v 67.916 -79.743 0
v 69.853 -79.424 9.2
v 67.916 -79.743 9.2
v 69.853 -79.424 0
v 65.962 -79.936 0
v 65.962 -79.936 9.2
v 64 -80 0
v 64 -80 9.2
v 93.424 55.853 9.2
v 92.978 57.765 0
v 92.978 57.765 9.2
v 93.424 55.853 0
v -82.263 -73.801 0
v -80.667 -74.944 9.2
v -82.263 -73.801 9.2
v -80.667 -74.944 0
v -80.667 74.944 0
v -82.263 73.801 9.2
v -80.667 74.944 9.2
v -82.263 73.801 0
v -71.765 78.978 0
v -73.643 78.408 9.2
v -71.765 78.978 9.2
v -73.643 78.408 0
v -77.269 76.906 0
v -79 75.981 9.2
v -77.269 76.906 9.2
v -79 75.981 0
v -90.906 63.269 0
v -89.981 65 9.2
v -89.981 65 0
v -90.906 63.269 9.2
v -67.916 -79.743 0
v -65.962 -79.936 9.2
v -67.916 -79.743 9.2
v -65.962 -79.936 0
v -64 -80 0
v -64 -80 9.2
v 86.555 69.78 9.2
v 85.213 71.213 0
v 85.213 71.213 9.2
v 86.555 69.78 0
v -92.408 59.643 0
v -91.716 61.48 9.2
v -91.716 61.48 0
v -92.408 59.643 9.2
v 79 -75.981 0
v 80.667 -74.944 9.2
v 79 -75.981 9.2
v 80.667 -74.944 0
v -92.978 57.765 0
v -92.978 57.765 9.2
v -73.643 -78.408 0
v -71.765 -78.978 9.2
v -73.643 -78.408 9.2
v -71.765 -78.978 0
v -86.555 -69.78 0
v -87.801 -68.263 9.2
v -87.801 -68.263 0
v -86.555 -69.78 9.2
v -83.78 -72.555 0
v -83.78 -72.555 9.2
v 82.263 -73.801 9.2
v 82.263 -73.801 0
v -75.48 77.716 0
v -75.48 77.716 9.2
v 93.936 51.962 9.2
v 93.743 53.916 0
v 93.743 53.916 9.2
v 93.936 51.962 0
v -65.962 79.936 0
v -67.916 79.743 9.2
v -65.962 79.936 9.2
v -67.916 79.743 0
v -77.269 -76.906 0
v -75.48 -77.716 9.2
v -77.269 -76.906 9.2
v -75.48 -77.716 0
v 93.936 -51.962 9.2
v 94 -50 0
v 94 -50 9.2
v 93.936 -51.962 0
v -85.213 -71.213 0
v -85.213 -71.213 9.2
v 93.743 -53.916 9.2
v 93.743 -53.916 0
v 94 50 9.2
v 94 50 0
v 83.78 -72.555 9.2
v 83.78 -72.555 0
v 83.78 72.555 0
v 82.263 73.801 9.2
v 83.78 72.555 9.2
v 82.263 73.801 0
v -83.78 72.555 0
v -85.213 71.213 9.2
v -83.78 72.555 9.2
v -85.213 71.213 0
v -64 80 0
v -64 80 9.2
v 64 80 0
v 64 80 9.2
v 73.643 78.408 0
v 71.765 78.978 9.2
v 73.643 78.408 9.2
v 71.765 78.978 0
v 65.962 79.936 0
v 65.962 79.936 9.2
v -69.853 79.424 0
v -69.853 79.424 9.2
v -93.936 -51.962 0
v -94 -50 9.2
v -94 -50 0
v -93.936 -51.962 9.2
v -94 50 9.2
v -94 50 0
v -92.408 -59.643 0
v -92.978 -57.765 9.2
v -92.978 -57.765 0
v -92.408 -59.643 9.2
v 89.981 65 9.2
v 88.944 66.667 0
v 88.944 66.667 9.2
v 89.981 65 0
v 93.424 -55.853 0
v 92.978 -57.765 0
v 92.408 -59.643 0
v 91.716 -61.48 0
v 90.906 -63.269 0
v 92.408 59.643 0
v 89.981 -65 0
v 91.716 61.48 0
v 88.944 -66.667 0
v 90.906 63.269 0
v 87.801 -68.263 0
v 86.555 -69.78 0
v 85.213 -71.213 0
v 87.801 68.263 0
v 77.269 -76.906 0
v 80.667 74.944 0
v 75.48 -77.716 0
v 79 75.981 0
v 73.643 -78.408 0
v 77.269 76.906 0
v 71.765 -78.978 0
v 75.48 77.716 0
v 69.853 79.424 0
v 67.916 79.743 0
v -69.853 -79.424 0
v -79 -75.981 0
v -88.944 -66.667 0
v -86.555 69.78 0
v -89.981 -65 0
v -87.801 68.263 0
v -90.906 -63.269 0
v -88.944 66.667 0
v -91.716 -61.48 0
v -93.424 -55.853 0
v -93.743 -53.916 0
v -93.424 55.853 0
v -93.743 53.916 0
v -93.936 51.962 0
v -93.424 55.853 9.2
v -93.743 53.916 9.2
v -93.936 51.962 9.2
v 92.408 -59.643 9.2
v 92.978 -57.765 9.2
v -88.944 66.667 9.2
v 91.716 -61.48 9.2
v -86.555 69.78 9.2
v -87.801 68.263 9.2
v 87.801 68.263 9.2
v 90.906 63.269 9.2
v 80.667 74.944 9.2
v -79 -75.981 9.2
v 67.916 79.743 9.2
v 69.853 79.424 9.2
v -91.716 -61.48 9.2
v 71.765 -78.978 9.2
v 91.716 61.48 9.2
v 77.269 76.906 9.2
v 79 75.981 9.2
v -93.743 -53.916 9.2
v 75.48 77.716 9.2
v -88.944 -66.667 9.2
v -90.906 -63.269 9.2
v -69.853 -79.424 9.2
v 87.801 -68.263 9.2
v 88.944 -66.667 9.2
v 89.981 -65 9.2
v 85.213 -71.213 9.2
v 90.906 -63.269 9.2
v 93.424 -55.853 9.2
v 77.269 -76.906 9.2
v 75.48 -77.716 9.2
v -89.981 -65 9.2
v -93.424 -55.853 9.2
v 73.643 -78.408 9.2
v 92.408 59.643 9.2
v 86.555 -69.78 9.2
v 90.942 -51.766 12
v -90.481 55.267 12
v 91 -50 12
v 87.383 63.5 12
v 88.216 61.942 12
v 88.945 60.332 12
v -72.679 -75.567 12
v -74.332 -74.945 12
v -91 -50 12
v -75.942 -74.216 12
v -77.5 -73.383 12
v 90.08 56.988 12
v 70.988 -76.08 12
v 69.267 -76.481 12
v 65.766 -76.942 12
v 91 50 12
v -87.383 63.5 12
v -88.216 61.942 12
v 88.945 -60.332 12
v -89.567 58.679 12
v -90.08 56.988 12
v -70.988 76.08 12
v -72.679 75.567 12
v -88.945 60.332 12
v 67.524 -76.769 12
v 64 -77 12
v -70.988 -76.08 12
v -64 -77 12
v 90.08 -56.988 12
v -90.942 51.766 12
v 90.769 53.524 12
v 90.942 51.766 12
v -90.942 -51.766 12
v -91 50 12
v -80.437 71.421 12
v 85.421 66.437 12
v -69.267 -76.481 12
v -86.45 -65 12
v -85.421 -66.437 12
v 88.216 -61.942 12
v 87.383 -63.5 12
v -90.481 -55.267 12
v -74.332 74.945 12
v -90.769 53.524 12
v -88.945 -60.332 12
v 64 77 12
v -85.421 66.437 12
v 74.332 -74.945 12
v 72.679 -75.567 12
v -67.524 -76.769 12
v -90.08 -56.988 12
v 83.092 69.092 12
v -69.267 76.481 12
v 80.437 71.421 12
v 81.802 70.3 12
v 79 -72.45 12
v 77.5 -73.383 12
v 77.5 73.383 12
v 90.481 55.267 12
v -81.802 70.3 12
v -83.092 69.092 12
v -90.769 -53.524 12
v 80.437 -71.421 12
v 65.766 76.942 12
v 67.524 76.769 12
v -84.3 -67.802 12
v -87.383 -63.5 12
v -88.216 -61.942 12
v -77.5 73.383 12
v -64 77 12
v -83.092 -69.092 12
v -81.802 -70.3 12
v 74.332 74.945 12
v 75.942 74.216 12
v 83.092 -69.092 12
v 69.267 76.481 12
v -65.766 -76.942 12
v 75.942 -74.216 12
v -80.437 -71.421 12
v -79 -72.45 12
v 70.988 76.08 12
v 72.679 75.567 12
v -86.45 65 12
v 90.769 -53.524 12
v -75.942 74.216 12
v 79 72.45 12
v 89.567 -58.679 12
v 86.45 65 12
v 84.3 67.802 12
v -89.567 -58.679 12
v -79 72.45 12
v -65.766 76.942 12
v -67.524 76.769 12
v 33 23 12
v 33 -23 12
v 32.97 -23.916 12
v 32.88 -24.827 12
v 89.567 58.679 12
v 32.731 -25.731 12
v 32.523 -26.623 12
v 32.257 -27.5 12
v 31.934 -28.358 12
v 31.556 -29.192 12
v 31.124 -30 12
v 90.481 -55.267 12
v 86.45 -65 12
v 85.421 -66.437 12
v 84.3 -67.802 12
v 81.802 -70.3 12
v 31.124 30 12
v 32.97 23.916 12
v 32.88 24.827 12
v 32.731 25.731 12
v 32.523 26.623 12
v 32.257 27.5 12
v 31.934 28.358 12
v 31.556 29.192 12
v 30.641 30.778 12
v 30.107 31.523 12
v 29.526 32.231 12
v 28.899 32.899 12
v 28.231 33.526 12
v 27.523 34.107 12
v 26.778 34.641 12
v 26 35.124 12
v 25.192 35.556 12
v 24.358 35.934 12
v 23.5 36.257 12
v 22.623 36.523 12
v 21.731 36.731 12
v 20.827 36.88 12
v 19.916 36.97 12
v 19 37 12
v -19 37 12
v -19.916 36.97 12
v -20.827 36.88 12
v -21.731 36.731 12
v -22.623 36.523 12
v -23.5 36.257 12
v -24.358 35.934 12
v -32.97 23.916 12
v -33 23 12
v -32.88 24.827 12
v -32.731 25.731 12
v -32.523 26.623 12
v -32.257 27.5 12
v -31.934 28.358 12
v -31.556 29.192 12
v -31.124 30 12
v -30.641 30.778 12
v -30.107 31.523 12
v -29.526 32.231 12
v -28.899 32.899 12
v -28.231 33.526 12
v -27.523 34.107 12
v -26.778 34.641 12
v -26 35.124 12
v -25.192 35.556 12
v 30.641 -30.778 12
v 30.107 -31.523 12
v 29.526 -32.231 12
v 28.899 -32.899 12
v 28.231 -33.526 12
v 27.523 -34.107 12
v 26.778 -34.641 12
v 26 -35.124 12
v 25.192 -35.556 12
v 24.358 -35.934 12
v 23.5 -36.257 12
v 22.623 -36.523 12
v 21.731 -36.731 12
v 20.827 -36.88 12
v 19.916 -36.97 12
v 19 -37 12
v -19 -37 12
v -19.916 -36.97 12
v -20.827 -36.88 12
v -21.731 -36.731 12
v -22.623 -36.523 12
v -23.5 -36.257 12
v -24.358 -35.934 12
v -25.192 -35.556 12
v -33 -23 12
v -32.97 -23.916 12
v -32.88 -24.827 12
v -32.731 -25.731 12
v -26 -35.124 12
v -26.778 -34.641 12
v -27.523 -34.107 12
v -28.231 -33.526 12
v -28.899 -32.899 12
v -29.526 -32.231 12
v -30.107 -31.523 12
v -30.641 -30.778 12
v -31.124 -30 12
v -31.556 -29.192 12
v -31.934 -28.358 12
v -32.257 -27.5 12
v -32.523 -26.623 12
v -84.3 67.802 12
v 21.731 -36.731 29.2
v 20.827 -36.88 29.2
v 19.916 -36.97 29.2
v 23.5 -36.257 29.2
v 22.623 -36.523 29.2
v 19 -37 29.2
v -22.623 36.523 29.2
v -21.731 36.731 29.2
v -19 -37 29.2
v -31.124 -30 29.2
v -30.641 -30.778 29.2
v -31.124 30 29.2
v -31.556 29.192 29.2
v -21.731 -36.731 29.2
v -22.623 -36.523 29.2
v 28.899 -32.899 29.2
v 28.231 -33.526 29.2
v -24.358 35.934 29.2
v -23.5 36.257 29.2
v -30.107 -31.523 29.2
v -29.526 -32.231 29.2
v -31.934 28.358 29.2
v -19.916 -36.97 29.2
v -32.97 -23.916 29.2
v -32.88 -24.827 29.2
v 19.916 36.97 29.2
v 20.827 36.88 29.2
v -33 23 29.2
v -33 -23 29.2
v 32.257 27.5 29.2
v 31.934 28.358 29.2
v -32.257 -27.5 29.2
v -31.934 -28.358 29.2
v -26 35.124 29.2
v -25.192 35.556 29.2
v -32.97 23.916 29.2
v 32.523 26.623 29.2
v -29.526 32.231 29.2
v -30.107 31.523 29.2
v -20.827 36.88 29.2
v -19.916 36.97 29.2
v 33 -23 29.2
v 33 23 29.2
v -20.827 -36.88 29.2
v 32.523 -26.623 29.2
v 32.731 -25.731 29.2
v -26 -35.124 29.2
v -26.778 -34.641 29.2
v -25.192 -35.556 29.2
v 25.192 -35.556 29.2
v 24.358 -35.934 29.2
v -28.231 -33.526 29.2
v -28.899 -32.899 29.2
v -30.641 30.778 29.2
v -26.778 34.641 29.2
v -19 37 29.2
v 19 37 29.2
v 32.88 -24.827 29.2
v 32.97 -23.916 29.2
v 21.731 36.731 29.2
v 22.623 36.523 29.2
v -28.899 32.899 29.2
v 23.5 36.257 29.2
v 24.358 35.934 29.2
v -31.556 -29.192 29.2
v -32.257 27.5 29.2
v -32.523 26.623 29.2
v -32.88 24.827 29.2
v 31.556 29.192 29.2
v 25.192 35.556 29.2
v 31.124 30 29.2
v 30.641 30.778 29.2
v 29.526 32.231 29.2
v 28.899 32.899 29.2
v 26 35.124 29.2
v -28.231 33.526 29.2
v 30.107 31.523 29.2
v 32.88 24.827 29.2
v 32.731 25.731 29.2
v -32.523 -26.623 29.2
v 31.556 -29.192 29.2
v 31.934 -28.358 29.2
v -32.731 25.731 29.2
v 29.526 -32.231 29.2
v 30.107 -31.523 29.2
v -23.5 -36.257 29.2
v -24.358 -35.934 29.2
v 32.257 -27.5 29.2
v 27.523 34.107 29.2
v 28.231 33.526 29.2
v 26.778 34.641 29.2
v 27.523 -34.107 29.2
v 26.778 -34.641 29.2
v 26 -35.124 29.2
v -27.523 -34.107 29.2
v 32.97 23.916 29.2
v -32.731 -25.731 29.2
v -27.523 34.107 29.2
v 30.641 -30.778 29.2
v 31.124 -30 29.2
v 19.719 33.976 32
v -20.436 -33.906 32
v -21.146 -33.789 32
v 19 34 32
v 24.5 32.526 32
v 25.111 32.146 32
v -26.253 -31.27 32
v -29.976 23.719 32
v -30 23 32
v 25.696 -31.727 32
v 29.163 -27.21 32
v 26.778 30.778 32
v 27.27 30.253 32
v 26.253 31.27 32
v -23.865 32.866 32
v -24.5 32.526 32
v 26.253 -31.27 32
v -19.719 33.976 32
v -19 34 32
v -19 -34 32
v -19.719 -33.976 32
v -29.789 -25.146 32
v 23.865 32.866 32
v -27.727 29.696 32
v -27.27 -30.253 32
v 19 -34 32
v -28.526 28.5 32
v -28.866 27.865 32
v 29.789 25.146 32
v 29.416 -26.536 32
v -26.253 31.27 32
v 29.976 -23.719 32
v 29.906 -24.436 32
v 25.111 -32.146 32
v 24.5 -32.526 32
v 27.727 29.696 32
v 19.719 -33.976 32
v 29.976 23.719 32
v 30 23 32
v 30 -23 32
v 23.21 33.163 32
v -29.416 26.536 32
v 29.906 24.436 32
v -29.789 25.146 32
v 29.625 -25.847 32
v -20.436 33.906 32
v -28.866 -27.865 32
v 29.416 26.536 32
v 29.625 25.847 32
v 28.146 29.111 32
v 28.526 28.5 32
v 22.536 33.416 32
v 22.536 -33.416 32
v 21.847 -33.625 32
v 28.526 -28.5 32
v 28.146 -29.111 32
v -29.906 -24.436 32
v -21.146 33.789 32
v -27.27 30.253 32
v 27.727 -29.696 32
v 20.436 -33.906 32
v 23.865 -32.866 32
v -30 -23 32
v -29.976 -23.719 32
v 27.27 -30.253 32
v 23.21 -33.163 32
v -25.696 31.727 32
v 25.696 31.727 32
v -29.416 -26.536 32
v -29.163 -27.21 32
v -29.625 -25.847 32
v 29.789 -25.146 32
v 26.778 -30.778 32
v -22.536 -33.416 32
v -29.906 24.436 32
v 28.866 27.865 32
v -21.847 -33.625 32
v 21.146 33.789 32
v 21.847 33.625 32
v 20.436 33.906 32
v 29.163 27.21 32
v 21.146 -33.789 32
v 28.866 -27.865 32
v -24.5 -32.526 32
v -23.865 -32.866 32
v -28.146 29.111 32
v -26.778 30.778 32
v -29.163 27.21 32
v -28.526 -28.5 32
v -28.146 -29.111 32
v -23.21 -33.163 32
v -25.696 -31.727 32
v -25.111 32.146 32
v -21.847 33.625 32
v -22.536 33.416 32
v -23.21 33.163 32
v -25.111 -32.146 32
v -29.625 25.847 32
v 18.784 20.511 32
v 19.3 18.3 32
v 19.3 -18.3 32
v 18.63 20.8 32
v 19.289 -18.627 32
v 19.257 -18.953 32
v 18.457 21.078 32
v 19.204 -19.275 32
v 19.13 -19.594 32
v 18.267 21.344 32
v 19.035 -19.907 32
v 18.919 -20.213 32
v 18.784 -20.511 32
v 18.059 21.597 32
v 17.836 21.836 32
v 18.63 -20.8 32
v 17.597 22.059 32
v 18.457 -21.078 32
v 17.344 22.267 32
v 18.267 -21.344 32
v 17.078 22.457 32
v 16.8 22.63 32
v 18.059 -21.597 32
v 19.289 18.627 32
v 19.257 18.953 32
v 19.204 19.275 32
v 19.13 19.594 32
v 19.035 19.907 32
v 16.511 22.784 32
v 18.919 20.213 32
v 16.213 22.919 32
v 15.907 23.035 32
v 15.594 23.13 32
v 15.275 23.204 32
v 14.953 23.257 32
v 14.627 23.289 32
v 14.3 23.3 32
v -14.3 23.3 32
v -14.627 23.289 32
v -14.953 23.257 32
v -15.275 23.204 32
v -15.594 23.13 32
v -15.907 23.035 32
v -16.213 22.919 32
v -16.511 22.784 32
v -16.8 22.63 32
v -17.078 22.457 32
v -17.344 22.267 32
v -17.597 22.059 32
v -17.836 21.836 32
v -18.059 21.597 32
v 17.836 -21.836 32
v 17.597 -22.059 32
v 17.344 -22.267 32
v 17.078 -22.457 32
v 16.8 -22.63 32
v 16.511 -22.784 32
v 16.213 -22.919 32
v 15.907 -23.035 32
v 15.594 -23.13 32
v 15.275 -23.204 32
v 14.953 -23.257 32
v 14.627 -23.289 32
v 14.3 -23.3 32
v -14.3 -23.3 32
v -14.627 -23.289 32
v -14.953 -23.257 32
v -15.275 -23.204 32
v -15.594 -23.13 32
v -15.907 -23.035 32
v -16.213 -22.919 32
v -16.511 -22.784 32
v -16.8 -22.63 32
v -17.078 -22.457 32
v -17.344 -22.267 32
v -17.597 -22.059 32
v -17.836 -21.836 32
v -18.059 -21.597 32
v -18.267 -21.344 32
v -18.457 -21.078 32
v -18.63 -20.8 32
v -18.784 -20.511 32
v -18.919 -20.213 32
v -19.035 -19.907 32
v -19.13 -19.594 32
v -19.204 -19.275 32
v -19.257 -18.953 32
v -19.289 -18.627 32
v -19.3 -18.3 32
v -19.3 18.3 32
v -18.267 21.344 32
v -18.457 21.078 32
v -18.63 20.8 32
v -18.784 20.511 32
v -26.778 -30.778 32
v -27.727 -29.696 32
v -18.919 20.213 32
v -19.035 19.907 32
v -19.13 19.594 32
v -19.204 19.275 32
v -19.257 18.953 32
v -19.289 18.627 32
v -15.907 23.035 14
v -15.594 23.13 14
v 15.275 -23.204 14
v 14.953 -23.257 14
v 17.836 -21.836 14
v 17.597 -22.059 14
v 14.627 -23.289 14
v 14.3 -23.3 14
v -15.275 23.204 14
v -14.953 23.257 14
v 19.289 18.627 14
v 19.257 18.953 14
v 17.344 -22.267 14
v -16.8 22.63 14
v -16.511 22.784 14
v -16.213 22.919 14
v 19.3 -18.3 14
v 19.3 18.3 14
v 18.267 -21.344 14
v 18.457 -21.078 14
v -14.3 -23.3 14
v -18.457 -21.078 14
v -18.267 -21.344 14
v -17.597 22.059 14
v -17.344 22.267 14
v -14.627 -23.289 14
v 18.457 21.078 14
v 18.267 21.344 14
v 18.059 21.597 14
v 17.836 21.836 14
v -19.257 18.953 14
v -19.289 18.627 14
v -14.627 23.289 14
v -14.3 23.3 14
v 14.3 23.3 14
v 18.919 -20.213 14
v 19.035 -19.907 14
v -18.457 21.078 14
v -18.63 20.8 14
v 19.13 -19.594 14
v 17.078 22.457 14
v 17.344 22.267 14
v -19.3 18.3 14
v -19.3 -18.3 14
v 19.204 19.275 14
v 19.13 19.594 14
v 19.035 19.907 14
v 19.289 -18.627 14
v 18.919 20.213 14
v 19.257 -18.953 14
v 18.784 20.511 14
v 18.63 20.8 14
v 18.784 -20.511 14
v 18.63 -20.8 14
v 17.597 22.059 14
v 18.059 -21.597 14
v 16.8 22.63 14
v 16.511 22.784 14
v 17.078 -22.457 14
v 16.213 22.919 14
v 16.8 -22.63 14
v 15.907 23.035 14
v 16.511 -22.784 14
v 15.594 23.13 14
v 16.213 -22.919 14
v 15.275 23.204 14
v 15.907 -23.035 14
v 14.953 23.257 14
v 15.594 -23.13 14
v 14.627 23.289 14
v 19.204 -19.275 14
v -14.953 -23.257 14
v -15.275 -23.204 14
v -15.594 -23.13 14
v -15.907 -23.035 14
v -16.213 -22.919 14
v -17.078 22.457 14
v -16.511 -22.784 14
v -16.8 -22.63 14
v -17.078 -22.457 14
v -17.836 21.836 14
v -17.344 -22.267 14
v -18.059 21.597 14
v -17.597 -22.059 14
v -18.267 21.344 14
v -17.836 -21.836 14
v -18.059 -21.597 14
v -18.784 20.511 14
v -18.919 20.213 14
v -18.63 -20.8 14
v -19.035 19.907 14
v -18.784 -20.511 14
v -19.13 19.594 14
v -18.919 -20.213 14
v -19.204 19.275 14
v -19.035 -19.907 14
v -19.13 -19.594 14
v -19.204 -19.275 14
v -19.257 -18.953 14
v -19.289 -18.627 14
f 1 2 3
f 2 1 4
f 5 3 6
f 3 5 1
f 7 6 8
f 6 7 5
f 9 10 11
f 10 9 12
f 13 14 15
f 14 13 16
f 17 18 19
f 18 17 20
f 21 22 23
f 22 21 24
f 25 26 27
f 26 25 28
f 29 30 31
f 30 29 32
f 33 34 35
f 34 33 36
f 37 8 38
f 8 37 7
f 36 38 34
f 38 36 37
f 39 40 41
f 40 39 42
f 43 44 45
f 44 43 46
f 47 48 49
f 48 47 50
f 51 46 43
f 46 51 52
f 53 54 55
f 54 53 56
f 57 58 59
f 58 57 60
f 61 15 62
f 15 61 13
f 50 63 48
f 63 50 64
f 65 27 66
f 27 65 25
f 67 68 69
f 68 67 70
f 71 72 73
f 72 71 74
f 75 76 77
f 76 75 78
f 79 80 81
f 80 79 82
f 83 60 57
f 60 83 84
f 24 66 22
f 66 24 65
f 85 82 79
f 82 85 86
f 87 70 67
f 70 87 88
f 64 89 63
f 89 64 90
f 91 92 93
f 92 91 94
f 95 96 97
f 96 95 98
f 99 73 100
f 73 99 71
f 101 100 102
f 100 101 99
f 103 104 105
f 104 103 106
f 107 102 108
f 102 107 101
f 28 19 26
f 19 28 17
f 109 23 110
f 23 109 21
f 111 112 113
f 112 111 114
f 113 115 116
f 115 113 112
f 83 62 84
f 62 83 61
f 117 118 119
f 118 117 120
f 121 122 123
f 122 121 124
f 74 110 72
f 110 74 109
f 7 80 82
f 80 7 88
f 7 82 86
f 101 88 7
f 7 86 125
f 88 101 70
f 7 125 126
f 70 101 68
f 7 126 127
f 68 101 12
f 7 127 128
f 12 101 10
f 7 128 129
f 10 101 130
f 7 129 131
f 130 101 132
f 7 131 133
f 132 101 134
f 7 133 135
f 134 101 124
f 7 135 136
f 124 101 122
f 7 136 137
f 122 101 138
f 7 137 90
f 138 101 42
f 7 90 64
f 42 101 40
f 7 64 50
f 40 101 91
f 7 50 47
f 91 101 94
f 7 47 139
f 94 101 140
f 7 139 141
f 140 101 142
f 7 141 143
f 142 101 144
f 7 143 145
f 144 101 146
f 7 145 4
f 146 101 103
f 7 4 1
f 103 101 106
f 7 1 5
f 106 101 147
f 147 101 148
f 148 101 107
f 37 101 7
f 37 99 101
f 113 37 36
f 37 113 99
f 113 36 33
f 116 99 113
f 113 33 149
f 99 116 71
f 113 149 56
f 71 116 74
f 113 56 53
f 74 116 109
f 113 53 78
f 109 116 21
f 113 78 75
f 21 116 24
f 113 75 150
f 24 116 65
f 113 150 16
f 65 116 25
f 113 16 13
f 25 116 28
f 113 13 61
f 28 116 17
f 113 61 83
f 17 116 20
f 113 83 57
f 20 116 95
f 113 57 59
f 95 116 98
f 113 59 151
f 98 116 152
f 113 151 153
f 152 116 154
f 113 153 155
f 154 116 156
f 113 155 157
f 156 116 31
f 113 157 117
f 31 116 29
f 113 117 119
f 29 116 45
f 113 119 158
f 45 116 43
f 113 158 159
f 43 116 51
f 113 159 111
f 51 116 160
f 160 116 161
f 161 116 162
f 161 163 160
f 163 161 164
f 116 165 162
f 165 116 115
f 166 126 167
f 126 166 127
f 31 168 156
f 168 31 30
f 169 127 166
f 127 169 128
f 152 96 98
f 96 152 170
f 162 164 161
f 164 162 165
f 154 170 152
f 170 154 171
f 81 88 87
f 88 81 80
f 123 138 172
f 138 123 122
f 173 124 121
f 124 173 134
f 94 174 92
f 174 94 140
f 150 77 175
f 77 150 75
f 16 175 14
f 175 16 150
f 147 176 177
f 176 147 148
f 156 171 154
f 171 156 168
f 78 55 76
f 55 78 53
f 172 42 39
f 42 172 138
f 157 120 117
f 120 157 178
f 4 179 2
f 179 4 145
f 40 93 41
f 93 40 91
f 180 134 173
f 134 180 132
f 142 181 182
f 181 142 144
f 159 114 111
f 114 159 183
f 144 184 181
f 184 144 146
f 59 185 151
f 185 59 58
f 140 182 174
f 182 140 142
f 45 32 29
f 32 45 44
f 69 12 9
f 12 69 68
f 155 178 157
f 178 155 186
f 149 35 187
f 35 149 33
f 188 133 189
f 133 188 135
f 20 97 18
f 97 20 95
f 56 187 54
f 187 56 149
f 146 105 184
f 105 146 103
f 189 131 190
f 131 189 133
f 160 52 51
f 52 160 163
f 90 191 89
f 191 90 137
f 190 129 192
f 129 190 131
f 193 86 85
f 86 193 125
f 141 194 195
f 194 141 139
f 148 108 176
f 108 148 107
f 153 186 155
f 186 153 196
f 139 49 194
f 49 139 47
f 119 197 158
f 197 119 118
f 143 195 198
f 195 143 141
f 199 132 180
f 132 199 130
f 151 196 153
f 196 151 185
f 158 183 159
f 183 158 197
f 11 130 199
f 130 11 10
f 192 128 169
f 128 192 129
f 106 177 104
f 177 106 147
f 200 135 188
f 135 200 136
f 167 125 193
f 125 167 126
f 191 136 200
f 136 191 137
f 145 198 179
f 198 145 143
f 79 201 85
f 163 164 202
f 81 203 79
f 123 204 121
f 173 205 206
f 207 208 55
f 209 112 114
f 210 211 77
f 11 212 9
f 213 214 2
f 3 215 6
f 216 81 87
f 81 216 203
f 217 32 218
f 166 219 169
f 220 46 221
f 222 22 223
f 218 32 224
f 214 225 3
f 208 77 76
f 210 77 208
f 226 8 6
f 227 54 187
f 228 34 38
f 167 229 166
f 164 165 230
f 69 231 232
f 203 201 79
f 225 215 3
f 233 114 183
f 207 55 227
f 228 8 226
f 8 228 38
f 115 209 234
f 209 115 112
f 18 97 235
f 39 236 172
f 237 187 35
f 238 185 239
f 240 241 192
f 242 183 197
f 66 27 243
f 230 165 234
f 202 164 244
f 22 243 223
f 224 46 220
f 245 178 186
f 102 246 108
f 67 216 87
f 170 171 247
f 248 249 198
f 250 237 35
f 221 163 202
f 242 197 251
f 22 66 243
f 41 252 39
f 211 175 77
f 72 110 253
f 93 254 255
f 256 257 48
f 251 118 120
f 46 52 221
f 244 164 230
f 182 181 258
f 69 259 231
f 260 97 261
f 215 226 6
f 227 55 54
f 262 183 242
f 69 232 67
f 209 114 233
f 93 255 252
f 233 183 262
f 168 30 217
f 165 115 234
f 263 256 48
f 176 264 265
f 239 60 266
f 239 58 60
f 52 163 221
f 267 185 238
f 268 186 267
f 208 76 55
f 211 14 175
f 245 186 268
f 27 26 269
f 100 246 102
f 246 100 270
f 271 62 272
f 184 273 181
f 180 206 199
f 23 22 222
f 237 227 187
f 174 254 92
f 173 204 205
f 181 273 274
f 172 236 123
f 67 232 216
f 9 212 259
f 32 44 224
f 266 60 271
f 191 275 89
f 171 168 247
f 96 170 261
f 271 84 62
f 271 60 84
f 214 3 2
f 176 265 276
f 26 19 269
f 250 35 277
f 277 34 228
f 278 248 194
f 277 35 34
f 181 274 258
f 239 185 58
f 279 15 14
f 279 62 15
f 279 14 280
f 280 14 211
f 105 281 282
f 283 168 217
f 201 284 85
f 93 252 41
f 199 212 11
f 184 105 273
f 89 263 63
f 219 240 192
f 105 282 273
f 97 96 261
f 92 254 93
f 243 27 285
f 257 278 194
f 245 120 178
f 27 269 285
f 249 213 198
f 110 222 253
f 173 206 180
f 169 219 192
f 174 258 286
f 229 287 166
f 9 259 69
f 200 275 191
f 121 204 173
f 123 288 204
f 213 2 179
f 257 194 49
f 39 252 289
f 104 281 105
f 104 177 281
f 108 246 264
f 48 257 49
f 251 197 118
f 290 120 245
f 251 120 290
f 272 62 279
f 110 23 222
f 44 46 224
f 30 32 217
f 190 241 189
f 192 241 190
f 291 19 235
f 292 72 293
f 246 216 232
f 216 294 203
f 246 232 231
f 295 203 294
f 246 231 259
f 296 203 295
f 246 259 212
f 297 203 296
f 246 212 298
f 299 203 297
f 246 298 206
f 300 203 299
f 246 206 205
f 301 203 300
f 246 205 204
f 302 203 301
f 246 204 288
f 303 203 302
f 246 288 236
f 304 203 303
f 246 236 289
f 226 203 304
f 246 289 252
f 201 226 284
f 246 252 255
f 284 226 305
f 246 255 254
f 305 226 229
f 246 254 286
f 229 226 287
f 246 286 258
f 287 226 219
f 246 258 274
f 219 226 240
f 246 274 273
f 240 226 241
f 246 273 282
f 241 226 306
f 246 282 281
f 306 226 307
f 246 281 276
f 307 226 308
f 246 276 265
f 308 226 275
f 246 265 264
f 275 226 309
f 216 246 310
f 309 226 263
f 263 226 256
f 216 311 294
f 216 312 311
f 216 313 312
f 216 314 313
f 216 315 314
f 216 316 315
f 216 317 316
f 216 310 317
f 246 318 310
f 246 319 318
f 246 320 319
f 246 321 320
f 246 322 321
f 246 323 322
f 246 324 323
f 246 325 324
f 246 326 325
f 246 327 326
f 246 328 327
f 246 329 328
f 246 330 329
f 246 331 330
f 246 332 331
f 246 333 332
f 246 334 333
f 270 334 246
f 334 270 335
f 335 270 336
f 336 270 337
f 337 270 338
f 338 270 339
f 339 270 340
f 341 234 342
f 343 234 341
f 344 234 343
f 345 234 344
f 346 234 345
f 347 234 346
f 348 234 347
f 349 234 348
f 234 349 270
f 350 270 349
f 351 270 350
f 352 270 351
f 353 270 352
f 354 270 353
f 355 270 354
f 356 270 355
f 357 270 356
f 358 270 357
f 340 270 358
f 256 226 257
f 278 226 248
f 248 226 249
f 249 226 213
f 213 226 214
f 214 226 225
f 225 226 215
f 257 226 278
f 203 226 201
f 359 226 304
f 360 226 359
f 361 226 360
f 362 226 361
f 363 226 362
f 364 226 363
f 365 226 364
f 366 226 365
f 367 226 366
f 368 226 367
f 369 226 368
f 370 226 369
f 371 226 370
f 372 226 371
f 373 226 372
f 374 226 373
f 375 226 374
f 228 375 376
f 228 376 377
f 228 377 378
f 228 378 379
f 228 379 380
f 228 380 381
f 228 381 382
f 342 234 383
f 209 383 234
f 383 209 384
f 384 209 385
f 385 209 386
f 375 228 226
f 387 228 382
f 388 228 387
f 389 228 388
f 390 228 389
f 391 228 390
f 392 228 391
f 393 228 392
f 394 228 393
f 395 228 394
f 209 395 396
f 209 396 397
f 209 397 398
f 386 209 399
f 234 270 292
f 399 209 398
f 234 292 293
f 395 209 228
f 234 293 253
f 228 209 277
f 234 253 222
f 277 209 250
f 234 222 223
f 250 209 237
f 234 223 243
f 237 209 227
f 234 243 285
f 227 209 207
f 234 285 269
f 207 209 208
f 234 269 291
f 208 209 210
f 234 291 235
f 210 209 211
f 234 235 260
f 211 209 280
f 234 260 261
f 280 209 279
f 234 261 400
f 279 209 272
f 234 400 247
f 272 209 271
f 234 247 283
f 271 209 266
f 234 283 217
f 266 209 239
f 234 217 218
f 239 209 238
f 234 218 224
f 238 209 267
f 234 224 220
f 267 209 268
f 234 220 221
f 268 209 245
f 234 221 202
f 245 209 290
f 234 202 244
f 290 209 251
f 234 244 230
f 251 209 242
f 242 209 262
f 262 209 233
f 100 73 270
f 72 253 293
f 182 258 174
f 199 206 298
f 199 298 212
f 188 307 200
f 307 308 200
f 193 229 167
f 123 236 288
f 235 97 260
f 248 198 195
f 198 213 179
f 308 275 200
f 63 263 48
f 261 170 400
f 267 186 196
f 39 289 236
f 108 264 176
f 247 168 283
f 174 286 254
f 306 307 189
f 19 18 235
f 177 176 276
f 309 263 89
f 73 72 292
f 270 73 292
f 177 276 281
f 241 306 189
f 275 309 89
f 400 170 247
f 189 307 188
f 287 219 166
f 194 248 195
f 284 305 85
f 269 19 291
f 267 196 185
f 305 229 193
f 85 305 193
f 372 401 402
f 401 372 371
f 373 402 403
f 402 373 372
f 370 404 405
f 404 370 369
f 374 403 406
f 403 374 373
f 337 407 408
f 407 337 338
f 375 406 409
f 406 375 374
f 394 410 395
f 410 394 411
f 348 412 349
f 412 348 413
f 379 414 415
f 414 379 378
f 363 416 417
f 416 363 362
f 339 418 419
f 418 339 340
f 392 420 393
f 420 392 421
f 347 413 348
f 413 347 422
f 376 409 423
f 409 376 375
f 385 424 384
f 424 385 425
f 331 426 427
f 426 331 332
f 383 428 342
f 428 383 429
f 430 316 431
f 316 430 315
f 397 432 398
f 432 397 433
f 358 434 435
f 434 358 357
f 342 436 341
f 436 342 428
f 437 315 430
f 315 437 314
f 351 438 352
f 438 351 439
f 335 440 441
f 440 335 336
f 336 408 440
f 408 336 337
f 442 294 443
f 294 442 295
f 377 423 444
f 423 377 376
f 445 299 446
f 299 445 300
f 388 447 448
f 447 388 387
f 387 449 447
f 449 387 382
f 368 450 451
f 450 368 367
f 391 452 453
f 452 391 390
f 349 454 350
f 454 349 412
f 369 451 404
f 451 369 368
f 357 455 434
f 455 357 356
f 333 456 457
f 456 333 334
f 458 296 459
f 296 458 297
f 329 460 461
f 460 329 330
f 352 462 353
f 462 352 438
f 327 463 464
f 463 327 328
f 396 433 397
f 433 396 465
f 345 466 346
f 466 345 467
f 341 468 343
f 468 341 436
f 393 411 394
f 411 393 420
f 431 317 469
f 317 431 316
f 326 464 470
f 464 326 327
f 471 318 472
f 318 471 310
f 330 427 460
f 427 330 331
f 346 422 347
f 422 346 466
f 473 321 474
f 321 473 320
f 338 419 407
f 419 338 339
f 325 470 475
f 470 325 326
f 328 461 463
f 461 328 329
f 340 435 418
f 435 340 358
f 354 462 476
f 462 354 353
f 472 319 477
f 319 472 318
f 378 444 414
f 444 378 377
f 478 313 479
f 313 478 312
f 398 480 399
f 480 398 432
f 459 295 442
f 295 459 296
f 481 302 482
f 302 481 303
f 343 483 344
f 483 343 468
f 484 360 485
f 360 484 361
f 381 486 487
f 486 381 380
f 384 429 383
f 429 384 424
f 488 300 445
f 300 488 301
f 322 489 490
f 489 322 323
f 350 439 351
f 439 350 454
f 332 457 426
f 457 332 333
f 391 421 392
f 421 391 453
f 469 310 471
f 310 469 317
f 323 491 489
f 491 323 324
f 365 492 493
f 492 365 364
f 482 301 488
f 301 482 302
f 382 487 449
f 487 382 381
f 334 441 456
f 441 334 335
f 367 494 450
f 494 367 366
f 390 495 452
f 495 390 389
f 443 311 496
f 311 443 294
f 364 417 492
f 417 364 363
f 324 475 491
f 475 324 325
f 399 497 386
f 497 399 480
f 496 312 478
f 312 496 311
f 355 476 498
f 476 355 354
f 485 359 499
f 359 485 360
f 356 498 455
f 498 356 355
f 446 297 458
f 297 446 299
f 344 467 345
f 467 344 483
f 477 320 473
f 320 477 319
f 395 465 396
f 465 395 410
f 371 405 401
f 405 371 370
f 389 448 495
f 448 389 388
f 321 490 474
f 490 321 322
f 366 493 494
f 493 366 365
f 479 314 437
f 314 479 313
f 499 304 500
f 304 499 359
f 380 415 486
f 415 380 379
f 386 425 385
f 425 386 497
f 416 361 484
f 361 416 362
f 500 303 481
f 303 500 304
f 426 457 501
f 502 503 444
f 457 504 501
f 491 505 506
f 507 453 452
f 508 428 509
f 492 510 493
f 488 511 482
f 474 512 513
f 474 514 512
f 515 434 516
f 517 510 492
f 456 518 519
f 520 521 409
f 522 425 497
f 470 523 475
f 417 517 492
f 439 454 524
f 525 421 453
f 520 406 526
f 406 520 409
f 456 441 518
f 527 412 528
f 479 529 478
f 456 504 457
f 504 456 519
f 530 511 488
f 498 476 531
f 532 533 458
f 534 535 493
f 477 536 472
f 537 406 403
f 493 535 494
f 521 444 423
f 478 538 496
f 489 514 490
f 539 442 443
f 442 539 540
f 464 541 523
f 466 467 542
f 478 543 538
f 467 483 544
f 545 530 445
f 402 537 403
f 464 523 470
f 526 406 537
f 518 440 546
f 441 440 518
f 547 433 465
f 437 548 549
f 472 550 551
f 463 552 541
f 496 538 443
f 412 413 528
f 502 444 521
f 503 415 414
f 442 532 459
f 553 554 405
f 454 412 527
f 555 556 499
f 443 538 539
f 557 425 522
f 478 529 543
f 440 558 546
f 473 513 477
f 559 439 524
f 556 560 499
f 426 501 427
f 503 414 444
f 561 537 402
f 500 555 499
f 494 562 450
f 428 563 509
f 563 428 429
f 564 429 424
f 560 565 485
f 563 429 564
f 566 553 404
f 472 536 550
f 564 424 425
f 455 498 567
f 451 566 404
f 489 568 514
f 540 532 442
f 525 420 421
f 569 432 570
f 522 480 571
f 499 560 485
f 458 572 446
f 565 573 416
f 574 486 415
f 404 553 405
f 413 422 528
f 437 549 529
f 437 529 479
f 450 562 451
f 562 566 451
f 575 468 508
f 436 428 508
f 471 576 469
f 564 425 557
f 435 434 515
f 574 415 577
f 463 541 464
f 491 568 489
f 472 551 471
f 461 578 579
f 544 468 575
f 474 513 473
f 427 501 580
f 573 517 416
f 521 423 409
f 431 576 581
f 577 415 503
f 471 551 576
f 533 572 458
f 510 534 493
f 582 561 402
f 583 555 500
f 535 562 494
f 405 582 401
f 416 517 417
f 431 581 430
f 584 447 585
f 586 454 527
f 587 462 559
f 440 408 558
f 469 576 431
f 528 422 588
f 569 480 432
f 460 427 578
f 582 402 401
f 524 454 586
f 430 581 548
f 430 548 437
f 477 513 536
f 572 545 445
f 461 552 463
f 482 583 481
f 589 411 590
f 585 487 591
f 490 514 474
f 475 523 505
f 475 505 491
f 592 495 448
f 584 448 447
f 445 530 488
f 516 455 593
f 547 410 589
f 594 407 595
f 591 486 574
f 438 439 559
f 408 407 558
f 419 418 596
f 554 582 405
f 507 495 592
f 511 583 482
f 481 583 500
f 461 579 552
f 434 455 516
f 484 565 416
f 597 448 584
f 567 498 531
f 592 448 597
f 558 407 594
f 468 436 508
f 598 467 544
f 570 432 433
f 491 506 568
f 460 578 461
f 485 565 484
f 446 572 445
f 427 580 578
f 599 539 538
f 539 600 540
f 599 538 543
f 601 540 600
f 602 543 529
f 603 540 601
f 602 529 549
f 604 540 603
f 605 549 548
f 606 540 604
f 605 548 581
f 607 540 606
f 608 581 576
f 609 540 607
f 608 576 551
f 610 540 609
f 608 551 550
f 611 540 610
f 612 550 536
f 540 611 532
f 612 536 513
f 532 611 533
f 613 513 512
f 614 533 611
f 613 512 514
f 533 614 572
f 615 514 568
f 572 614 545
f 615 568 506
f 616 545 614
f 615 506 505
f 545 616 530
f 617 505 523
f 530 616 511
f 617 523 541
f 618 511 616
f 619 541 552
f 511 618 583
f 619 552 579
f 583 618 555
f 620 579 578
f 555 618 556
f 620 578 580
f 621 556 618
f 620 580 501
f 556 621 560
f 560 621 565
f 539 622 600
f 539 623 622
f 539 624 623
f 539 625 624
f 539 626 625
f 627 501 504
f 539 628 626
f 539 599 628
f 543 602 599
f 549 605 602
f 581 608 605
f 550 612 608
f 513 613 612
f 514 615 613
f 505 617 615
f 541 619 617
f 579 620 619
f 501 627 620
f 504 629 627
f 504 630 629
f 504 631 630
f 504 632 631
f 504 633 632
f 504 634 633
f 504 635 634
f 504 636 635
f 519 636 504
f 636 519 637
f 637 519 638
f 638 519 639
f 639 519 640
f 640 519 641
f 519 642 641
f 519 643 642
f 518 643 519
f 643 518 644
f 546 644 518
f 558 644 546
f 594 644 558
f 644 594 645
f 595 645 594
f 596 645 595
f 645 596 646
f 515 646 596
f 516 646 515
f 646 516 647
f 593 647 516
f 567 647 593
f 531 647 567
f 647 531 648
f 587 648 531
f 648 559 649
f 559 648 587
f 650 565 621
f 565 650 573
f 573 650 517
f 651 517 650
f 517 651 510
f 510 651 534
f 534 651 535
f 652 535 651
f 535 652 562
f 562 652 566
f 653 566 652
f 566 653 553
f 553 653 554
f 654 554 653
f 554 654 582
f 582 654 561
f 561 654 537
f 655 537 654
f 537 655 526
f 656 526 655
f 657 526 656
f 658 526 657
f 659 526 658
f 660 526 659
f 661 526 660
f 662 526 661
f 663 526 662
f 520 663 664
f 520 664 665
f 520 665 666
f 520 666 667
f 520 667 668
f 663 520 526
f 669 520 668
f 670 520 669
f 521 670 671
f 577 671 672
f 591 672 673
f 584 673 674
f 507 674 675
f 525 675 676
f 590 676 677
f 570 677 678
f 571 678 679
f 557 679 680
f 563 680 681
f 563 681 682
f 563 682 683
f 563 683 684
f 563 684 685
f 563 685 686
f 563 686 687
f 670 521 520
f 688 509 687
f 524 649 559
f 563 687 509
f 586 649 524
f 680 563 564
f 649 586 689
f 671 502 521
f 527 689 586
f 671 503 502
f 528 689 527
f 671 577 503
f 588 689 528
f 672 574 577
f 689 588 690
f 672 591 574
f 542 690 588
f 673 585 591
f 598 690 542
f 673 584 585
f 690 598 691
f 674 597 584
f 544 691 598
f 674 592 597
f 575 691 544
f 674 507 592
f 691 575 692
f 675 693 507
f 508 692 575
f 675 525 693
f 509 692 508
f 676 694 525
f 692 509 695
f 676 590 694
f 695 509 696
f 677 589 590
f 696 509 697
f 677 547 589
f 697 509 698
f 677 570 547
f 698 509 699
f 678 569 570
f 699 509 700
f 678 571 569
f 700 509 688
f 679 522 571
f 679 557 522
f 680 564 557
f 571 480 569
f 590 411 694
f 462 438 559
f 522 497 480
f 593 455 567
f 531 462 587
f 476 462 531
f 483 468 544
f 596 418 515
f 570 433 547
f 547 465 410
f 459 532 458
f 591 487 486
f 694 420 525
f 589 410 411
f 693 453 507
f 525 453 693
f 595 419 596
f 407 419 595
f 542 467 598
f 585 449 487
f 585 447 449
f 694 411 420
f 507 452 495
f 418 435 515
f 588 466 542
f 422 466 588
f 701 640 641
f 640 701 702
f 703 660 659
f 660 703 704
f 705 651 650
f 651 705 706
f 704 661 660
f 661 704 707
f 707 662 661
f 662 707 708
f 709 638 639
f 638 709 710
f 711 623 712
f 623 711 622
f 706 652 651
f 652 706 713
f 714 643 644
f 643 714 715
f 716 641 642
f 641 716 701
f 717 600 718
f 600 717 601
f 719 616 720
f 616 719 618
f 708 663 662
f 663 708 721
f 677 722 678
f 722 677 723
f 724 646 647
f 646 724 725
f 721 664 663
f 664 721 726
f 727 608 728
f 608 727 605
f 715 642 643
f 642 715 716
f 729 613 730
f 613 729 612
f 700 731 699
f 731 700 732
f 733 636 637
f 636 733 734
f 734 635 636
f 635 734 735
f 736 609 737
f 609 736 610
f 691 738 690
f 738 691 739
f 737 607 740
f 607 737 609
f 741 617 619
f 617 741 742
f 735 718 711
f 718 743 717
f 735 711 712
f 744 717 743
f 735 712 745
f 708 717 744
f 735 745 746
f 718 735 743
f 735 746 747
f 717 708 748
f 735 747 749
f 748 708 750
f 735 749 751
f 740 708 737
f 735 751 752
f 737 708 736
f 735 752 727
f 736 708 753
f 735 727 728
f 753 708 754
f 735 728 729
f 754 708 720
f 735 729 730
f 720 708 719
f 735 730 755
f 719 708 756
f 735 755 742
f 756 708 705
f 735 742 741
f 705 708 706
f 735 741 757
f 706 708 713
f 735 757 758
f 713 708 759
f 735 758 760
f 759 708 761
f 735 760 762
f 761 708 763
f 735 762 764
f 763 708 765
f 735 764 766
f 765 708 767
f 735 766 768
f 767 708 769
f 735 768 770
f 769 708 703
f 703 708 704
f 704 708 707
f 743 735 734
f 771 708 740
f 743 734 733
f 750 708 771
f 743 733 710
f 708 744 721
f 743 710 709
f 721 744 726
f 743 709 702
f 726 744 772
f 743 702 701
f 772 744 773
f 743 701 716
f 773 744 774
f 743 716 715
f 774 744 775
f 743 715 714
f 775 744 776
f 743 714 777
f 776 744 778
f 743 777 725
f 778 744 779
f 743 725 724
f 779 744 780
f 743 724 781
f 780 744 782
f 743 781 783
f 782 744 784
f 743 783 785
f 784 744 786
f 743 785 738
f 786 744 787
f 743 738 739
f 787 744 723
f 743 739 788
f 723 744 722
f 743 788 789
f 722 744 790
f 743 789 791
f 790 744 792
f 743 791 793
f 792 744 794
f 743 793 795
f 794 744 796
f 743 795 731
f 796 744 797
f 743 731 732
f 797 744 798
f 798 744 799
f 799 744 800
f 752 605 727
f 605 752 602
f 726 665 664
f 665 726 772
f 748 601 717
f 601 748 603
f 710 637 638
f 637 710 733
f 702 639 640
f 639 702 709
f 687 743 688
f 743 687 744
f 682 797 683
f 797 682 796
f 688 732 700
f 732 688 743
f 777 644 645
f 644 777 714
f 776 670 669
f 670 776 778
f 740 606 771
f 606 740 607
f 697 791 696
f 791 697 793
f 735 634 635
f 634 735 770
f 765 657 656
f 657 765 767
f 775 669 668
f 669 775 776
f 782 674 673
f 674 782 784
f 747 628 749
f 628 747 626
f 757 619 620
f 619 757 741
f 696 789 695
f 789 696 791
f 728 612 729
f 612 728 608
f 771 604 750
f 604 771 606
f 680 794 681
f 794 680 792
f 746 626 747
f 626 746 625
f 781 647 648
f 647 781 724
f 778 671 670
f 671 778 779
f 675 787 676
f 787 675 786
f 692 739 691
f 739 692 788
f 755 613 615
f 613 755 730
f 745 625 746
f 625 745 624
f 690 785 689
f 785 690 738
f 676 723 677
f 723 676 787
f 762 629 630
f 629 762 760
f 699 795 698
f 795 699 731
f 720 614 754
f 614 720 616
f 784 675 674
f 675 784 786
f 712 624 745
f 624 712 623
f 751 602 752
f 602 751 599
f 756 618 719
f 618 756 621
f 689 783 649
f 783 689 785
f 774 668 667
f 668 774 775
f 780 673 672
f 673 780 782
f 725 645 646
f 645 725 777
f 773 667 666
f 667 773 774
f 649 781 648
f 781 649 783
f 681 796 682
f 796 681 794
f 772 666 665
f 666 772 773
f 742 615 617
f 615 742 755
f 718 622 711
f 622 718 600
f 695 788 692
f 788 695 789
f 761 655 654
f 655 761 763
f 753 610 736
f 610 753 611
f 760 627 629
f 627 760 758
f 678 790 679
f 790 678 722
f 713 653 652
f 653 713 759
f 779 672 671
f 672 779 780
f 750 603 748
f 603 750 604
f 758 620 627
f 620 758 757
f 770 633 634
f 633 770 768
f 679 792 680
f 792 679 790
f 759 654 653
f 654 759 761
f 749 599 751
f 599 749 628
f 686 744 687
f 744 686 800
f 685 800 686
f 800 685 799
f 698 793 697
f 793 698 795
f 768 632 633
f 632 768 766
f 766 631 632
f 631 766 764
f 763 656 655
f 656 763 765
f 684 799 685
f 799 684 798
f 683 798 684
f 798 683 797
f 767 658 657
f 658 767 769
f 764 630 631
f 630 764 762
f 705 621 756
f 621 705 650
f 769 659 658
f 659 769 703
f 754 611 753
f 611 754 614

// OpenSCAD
// Headphone stand in three printable parts: base, post, hanger.
// No glue, no screws. Rectangular (non-round) blade tenons prevent spinning.
// All dimensions in mm. Print orientation is the exported orientation (+Z up).
//
// Assembly heights (assembly coordinates, desk at z=0):
//   base plate/boss top        0 .. 32
//   post                       14.5 .. 250  (17.5 mm of it inside the base socket)
//   hanger tenon               228.5 .. 250 (21.5 mm inside the post socket)
//   hanger saddle top centre   270
// Socket clearances: 0.3 mm per side (socket is tenon + 0.6 in each dimension),
// tenon tips stop 0.5 mm above socket floors; shoulders/faces give the depth stop
// for the hanger, and the post bottoms in its socket.

part = "base"; // [base, post, hanger, assembly]
cadverify_only = "";

$fn = 96;

/* [Base] */
base_w = 188;          // desk footprint, X
base_d = 160;          // desk footprint, Y
base_plate_top = 9;    // straight plate wall up to here, then 45 deg chamfer to 12
base_top_plate = 12;
boss_w = 66;
boss_d = 74;
boss_straight_top = 29; // then 45 deg chamfer to boss_top
boss_top = 32;
base_socket_w = 38.6;  // post 38 + 0.6
base_socket_d = 46.6;  // post 46 + 0.6
base_socket_floor = 14;

/* [Post] */
post_w = 38;
post_d = 46;
post_len = 235.5;      // tip (local z=0) to top (assembly 250)
post_top_socket_w = 24.6; // hanger tenon 24 + 0.6
post_top_socket_d = 34.6; // hanger tenon 34 + 0.6
post_top_socket_floor_local = 213.5; // assembly 228

/* [Hanger, modelled in print coordinates] */
// Print coordinates: X = saddle length, Y = height above tenon tip,
// Z = saddle width direction (part lies on its Z=0 side face on the bed).
hang_len_half = 69;    // overall saddle half length incl. rounded end point
hang_width = 34;       // >= 30 mm headband support width
hang_top_rel = 41.5;   // tenon tip to saddle crown; assembly 228.5 + 41.5 = 270
hang_arc_r = 170;      // crown radius of the headband contact surface
hang_plate_t = 10;     // saddle plate thickness (vertical, in profile)
hang_tenon_half_w = 12;  // tenon is 24 (X) x 34 (width)
hang_shoulder_rel = 21.5; // assembly 250, post top
hang_neck_half_w = 17;

function hang_top_z(x) = hang_top_rel - (hang_arc_r - sqrt(hang_arc_r*hang_arc_r - x*x));
function hang_bot_z(x) = hang_top_z(x) - hang_plate_t;

module rounded_rect(w, d, r) {
    offset(r = r) square([w - 2*r, d - 2*r], center = true);
}

module instance(name, part_name, unit = 1) {
    echo(cadverify_instance = [name, part_name, unit]);
    if (cadverify_only == "" || cadverify_only == name) children();
}

/* ---------- BASE (print = assembly orientation) ---------- */
module base_part() {
    difference() {
        union() {
            // desk plate with 45 deg top edge chamfer
            linear_extrude(base_plate_top) rounded_rect(base_w, base_d, 30);
            hull() {
                translate([0, 0, base_plate_top]) linear_extrude(0.2)
                    rounded_rect(base_w, base_d, 30);
                translate([0, 0, base_top_plate - 0.2]) linear_extrude(0.2)
                    rounded_rect(base_w - 6, base_d - 6, 27);
            }
            // raised boss / collar around the post socket, 45 deg top chamfer
            translate([0, 0, base_top_plate])
                linear_extrude(boss_straight_top - base_top_plate)
                    rounded_rect(boss_w, boss_d, 14);
            hull() {
                translate([0, 0, boss_straight_top]) linear_extrude(0.2)
                    rounded_rect(boss_w, boss_d, 14);
                translate([0, 0, boss_top - 0.2]) linear_extrude(0.2)
                    rounded_rect(boss_w - 6, boss_d - 6, 11);
            }
        }
        // blind rectangular socket for the post (stops post spinning)
        translate([0, 0, base_socket_floor])
            linear_extrude(boss_top - base_socket_floor + 2)
                rounded_rect(base_socket_w, base_socket_d, 5);
    }
}

/* ---------- POST (printed upright, local z=0 is tenon tip) ---------- */
module post_part() {
    difference() {
        linear_extrude(post_len) rounded_rect(post_w, post_d, 8);
        // blind rectangular socket in the top for the hanger blade tenon
        translate([0, 0, post_top_socket_floor_local])
            linear_extrude(post_len - post_top_socket_floor_local + 2)
                rounded_rect(post_top_socket_w, post_top_socket_d, 5);
    }
}

/* ---------- HANGER (printed on its side) ---------- */
module hanger_part() {
    top_pts    = [for (x = [56 : -8 : -56]) [x, hang_top_z(x)]];
    bot_r_pts  = [for (x = [40 : 8 : 64]) [x, hang_bot_z(x)]];
    bot_l_pts  = [for (x = [-64 : 8 : -40]) [x, hang_bot_z(x)]];
    mid64 = (hang_top_z(64) + hang_bot_z(64)) / 2;
    profile = concat(
        [[-10, 0], [10, 0], [12, 2], [12, hang_shoulder_rel],
         [hang_neck_half_w, hang_shoulder_rel], [30, hang_bot_z(30)]],
        bot_r_pts,
        [[hang_len_half - 0.5, mid64], [64, hang_top_z(64)]],
        top_pts,
        [[-64, hang_top_z(64)], [-(hang_len_half - 0.5), mid64], [-64, hang_bot_z(64)]],
        bot_l_pts,
        [[-30, hang_bot_z(30)], [-hang_neck_half_w, hang_shoulder_rel],
         [-hang_tenon_half_w, hang_shoulder_rel], [-12, 2]]
    );
    difference() {
        linear_extrude(hang_width) polygon(profile);
        // 45 deg chamfers on the two crown side edges, centre contact zone only.
        // Plane (print coords): Z + Y = 38.5 + 34 on the far side ...
        translate([0, 38.5, hang_width]) rotate([-45, 0, 0])
            translate([-85, -40, 0]) cube([170, 80, 40]);
        // ... and Z - Y = -38.5 on the bed side.
        translate([0, 38.5, 0]) rotate([45, 0, 0])
            translate([-85, -40, -40]) cube([170, 80, 40]);
    }
}

/* ---------- Spec echoes ---------- */
if (part == "base") {
    echo(cadverify_spec = [
        ["bounds", [[-base_w/2, -base_d/2, 0], [base_w/2, base_d/2, boss_top]]],
        ["bodies", 1],
        ["through_holes", 0],
        ["support_faces", [["desk", "-z", 25000]]],
        ["overhangs_allowed", []],
        ["copies", 1],
        ["details", [
            ["plate", "material", [[-80, -60, 2], [80, 60, 10]], 0.99],
            ["boss_wall", "material", [[22, -30, 16], [31, 30, 28]], 0.99],
            ["post_socket", "void", [[-17, -21, 16], [17, 21, 30]], 0.99],
            ["socket_floor", "thickness", [0, 0, 42], [0, 0, -1], base_socket_floor],
            ["boss_socket_top", "view", [[-34, -38, 27], [34, 38, boss_top]]]
        ]]
    ]);
} else if (part == "post") {
    echo(cadverify_spec = [
        ["bounds", [[-post_w/2, -post_d/2, 0], [post_w/2, post_d/2, post_len]]],
        ["bodies", 1],
        ["through_holes", 0],
        ["support_faces", [["bed", "-z", 1500]]],
        ["overhangs_allowed", []],
        ["copies", 1],
        ["details", [
            ["column", "material", [[-16, -20, 30], [16, 20, 200]], 0.99],
            ["hanger_socket", "void", [[-10, -15, 216], [10, 15, 234]], 0.99],
            ["column_width", "thickness", [32, 0, 100], [-1, 0, 0], post_w],
            ["top_socket", "view", [[-19, -23, 210], [19, 23, post_len]]]
        ]]
    ]);
} else if (part == "hanger") {
    // actual extreme points are the saddle end tips at +-(hang_len_half - 0.5)
    echo(cadverify_spec = [
        ["bounds", [[-(hang_len_half - 0.5), 0, 0], [hang_len_half - 0.5, hang_top_rel, hang_width]]],
        ["bodies", 1],
        ["through_holes", 0],
        ["support_faces", [["bed", "-z", 1200]]],
        ["overhangs_allowed", [
            ["45deg crown chamfer on bed side", [[-36, 37, 0], [36, hang_top_rel, 5]]]
        ]],
        ["copies", 1],
        ["details", [
            ["saddle_plate", "material", [[-25, 32, 5], [25, 38, 29]], 0.99],
            ["tenon", "material", [[-10, 2, 5], [10, 20, 29]], 0.99],
            ["saddle_thickness", "thickness", [50, 52, 17], [0, -1, 0], hang_plate_t],
            ["rounded_crown", "view", [[-40, 27, 0], [40, hang_top_rel, hang_width]]]
        ]]
    ]);
} else if (part == "assembly") {
    echo(cadverify_spec = [
        ["bounds", [[-base_w/2, -base_d/2, 0], [base_w/2, base_d/2, 270]]],
        ["support_faces", [["desk", "-z", 25000]]],
        ["allowed_interferences", []],
        ["assembly_order", [
            [["base"], [0, 0, 0]],
            [["post"], [0, 0, -1]],
            [["hanger"], [0, 0, -1]]
        ]]
    ]);
}

/* ---------- Output ---------- */
if (part == "base") {
    base_part();
} else if (part == "post") {
    post_part();
} else if (part == "hanger") {
    hanger_part();
} else if (part == "assembly") {
    instance("base", "base") base_part();
    instance("post", "post") translate([0, 0, 14.5]) post_part();
    // hanger print coords (x, y=height rel. tenon tip, z=width)
    //   -> assembly (x, 17-z, 228.5+y): tenon tip at 228.5, crown at 270
    instance("hanger", "hanger")
        translate([0, hang_width/2, 228.5]) rotate([90, 0, 0]) hanger_part();
} else {
    assert(false, str("unknown part: ", part));
}
